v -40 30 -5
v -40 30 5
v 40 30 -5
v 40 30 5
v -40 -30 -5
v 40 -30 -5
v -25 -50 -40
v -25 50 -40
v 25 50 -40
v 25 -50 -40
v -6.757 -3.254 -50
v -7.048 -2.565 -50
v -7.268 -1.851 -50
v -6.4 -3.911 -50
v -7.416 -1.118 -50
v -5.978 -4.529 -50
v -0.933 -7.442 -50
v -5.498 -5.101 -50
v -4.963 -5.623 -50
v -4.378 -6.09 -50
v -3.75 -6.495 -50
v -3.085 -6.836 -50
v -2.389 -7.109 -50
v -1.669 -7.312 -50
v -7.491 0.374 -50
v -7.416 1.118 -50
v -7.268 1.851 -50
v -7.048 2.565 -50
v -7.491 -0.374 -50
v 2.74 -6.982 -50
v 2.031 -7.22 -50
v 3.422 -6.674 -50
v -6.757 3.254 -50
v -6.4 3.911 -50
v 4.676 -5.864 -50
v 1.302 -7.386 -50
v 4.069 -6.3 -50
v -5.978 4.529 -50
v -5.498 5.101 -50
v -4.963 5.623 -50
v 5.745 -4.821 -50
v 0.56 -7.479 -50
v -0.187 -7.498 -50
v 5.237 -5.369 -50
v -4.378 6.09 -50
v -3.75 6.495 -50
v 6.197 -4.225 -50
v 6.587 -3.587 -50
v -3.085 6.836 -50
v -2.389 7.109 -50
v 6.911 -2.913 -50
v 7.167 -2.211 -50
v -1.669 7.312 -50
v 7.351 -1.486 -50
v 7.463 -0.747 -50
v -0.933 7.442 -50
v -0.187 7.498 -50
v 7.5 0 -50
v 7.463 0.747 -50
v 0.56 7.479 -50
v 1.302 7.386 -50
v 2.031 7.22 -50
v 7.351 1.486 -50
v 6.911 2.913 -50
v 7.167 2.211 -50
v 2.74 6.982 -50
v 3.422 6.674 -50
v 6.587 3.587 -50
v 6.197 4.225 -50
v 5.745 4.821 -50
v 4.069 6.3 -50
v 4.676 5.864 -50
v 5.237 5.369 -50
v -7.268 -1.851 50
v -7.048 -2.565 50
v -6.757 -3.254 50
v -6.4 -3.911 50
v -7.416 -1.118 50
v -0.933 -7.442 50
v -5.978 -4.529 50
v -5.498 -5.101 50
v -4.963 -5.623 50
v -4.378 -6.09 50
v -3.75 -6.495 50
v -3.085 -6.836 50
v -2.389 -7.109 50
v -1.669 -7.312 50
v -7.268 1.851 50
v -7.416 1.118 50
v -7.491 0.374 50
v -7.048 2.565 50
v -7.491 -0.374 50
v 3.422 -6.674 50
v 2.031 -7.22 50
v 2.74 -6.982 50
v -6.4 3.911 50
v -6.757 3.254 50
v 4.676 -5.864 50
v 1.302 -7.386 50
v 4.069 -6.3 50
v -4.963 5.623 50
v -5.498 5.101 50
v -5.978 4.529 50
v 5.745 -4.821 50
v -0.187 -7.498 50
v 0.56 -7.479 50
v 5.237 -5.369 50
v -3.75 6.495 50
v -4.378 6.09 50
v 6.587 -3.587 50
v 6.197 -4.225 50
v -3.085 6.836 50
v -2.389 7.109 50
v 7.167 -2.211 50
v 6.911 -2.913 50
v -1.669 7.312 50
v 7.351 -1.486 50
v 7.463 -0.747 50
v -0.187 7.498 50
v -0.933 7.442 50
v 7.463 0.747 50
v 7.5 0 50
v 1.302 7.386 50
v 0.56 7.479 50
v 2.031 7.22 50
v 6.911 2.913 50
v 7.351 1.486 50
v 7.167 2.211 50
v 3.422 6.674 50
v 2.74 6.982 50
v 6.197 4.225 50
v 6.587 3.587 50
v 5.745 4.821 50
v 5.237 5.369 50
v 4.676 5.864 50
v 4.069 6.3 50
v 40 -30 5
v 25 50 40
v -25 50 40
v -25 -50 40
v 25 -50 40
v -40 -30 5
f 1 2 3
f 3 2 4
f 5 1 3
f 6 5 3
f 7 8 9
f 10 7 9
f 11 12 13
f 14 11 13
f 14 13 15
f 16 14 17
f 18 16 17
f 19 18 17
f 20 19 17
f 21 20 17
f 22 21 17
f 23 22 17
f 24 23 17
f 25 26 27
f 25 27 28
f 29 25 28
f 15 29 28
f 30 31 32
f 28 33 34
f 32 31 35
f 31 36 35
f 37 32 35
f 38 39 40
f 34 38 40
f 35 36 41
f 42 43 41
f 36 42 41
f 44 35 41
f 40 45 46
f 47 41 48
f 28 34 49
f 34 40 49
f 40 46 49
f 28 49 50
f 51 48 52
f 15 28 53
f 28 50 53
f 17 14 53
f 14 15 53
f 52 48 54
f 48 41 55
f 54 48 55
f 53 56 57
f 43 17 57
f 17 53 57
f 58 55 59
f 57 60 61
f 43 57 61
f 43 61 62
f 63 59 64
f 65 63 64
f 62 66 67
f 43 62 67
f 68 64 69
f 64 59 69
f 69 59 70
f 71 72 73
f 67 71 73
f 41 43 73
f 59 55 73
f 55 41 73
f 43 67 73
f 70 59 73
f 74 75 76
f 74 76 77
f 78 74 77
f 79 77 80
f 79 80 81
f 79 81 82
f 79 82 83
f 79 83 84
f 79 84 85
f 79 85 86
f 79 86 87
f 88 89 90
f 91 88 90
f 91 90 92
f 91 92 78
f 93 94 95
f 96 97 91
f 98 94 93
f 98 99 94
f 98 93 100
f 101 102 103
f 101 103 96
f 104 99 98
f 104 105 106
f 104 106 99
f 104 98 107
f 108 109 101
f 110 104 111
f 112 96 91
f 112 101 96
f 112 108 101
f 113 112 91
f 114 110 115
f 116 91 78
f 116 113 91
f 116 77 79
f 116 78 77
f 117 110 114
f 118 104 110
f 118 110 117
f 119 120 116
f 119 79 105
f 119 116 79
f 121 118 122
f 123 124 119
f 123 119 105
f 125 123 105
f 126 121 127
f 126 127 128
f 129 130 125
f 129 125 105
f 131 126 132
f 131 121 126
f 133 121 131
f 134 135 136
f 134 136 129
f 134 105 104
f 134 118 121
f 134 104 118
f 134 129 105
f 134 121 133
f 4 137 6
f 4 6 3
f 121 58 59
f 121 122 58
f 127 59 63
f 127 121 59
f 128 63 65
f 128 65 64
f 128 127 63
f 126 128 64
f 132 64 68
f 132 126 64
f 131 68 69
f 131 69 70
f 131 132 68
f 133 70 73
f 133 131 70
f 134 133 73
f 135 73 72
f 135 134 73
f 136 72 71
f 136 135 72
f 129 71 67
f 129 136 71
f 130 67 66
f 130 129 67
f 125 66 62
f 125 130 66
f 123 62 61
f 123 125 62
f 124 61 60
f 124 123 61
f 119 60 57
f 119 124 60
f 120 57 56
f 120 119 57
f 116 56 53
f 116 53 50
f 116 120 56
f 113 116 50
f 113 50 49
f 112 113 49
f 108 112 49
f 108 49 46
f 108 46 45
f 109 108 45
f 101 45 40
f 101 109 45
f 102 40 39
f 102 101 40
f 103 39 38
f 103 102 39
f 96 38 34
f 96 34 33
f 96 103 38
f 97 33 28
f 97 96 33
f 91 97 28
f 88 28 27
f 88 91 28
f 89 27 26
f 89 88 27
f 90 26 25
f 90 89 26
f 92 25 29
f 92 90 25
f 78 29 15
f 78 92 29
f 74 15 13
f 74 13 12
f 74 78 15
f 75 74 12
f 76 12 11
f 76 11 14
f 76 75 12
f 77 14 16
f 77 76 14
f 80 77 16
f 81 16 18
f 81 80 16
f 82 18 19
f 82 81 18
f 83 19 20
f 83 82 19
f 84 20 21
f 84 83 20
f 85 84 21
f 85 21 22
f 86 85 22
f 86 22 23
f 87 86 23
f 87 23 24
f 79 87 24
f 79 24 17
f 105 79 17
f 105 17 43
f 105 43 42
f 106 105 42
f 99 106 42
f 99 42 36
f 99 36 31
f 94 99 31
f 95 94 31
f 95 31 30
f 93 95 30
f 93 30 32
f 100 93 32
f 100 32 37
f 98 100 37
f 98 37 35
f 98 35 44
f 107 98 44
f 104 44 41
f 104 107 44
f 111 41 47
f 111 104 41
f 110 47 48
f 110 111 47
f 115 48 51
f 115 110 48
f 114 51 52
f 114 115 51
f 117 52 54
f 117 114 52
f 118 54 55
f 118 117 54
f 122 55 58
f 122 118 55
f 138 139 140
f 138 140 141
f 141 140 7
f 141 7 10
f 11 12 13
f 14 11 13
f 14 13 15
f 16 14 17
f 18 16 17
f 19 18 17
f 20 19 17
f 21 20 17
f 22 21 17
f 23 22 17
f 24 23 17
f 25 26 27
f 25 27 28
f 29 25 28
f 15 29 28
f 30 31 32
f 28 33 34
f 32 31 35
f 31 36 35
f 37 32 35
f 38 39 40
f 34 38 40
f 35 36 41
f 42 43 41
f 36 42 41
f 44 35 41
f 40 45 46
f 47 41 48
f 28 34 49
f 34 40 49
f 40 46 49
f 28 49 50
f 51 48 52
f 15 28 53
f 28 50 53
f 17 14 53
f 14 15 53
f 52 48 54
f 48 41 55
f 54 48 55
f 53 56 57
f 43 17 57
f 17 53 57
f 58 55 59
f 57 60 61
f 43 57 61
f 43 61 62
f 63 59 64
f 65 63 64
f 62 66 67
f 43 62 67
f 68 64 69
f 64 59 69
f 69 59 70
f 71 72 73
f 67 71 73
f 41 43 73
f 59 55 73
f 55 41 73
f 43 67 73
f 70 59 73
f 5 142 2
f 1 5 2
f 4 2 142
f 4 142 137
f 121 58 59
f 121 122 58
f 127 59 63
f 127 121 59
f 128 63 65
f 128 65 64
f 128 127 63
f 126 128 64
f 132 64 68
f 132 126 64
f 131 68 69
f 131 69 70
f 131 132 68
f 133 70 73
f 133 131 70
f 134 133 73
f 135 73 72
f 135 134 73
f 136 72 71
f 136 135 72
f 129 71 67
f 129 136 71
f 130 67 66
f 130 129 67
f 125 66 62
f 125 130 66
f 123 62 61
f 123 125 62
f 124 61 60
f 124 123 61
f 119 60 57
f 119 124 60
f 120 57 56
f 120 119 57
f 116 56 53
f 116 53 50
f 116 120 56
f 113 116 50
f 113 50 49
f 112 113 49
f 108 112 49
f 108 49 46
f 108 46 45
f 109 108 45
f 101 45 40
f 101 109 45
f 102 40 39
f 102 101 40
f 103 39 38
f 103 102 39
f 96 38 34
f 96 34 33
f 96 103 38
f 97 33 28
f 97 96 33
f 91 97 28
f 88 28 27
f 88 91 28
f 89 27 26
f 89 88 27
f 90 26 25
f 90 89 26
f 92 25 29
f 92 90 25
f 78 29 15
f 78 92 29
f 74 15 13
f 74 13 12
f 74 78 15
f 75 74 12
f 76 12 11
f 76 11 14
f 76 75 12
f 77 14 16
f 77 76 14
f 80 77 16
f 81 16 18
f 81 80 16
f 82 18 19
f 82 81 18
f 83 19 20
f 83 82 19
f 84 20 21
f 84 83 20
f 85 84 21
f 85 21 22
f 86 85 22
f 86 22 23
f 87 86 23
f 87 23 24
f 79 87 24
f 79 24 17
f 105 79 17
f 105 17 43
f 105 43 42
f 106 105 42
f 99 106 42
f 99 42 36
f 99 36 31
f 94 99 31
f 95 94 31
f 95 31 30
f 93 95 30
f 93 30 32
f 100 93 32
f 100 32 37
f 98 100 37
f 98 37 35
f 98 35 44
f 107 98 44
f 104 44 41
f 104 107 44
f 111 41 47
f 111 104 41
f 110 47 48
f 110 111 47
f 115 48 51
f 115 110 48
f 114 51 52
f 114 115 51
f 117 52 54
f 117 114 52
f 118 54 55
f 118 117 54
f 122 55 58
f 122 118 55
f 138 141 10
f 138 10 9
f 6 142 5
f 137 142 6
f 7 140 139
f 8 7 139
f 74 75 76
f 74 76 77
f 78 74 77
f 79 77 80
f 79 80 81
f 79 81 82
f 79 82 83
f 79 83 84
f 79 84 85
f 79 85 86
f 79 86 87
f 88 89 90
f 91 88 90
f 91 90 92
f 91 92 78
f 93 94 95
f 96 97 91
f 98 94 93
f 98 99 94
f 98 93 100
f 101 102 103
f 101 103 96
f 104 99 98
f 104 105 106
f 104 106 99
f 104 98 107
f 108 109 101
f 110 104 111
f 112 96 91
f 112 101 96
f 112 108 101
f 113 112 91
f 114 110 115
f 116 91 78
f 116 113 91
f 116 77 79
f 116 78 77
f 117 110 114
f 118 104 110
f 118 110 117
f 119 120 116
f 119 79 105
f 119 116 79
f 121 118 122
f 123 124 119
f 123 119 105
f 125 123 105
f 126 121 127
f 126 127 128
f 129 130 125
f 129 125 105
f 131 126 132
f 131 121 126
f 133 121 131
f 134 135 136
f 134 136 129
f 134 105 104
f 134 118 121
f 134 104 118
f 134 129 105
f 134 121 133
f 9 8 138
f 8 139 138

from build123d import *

# Parameters (mm, degrees)
F0_W     = 50
F0_H     = 100
F1_DEPTH = 40
F2_R     = 7.5
F3_DEPTH = 50
F4_R     = 7.5
F5_DEPTH = 50
F6_W     = 80
F6_H     = 60
F7_DEPTH = 5


with BuildPart() as f1:
    # F0 (on Top) → F1 (new body, symmetric)
    with BuildSketch(Plane.XY):
        Rectangle(F0_W, F0_H)
    extrude(amount=F1_DEPTH, both=True)


with BuildPart() as f3:
    # F2 (on Top) → F3 (new body, symmetric)
    with BuildSketch(Plane.XY):
        Circle(F2_R)
    extrude(amount=F3_DEPTH, both=True)


with BuildPart() as f5:
    # F4 (on Top) → F5 (new body, symmetric)
    with BuildSketch(Plane.XY):
        Circle(F4_R)
    extrude(amount=F5_DEPTH, both=True)


with BuildPart() as f7:
    # F6 (on Top) → F7 (new body, symmetric)
    with BuildSketch(Plane.XY):
        Rectangle(F6_W, F6_H)
    extrude(amount=F7_DEPTH, both=True)


solid = Compound([f1.part, f3.part, f5.part, f7.part])
